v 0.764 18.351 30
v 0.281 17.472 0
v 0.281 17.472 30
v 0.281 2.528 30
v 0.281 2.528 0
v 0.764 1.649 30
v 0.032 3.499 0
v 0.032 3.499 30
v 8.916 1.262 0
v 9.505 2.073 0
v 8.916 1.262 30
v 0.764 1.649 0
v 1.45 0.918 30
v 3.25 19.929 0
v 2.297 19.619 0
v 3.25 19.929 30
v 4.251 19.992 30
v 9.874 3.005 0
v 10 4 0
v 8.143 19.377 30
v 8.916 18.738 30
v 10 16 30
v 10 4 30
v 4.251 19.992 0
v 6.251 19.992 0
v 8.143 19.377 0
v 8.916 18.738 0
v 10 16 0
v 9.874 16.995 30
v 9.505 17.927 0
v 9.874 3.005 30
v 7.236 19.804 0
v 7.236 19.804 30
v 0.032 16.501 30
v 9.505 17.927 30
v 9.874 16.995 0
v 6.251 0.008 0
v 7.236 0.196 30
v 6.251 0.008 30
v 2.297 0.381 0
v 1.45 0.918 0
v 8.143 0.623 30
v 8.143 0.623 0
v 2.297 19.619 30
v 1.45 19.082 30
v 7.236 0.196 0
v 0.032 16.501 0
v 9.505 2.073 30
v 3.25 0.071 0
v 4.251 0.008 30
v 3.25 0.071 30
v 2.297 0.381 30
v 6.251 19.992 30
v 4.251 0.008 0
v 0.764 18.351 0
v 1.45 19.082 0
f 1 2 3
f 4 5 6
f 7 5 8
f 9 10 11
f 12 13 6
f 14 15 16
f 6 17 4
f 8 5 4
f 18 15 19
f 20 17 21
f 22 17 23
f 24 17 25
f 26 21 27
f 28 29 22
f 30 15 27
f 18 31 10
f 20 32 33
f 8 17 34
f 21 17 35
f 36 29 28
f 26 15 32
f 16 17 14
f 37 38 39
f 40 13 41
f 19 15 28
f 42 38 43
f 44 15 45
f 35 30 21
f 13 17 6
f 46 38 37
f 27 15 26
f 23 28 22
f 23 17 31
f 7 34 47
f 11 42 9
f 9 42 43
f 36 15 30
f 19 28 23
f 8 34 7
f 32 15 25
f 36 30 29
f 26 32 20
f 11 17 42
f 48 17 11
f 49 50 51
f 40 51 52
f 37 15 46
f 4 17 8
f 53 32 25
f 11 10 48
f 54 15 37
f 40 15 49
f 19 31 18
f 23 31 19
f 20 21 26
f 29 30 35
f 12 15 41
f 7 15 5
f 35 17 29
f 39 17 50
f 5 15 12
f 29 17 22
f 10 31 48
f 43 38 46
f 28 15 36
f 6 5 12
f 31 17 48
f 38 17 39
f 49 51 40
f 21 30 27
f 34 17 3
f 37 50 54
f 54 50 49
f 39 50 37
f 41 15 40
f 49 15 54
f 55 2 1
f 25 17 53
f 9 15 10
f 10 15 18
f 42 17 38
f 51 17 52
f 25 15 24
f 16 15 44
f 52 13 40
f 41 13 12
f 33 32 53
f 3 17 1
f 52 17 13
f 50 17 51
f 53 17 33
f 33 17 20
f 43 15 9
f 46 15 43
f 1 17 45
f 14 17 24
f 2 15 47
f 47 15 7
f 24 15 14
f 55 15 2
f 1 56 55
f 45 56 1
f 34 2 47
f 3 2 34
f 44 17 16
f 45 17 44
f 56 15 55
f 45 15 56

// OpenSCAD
//divided_box(100, 50, 30, 4, 2, 8, 3, 2, 25,0,[1]);
smooth_rect(10,20,30,4);
//Divided box module
//x, y, and z are the size of the box.
//base_ht is the thickness of the base.
//wall_t is the thickness of the walls.
//crad is the radius of the corners. If it's <= 0, the box will have sharp corners.
//If either the base height or the wall thickness are <= 0, the box will be solid.
//x_div and y_div are the numbers of divisions in the box in the x and y directions.
//div_height is the height of the dividers; if <=0, this is set to the height of the box.
//x_skips and y_skips are arrays that list the numbered dividers to skip.

module divided_box(x, y, z,
                    base_ht = 0,
                    wall_t = 0,
                    crad = 0,
                    x_div = 0,
                    y_div = 0,
                    div_height = 0,
                    x_skips = [], y_skips = [])
{
    translate([-x/2, -y/2, 0])
    {
        int_crad = crad - wall_t;
        //Set or clear the divider heights
        divider_height = div_height <=0? z:div_height;
        //Set or clear whether or not the box is solid
        solidbox = ((base_ht <= 0)||(wall_t <= 0))? true:false;
        echo ("Solidbox: ");
        echo (solidbox);
    //    bht = box_base_height;
        difference() {
            //Outside of box:
            smooth_rect(x, y, z,crad);
            //If not a solid box, remove the inside area:
            if (!solidbox)
            {
                translate([crad-int_crad, crad-int_crad, base_ht]) smooth_rect(x - 2*wall_t, y - 2*wall_t, z, int_crad);
            }
        }
        //Add the X dividers
        if (x_div > 0) {
            for(i = [1:x_div])
            {
                skip = len(search(i, x_skips)) > 0? true : false;
                if (!skip)
                {
                    compartment = (x)/(x_div + 1);
                    translate([compartment * i - (wall_t/2),0,0]) cube([wall_t, y, divider_height]);
                }
            }
        }
        if (y_div > 0) {
            for(i = [1:y_div])
            {
                skip = len(search(i, y_skips)) > 0? true : false;
                if (!skip)
                {
                    compartment = (y)/(y_div + 1);
                    translate([0,compartment * i - (wall_t/2),0]) cube([x, wall_t, divider_height]);
                }
            }
        }
    }
}

module smooth_rect(x, y, z, rad)
{
    module corner()
        {
            cylinder(z,rad,rad,$fn=25);
        }
    if (rad > 0)
    {
        hull() {
            translate([rad,rad,0]) corner();
            translate([x-rad,rad,0]) corner();
            translate([rad,y-rad,0]) corner();
            translate([x-rad,y-rad,0]) corner();
        }
    }
    else
    {
        cube([x,y,z]);
    }
}
